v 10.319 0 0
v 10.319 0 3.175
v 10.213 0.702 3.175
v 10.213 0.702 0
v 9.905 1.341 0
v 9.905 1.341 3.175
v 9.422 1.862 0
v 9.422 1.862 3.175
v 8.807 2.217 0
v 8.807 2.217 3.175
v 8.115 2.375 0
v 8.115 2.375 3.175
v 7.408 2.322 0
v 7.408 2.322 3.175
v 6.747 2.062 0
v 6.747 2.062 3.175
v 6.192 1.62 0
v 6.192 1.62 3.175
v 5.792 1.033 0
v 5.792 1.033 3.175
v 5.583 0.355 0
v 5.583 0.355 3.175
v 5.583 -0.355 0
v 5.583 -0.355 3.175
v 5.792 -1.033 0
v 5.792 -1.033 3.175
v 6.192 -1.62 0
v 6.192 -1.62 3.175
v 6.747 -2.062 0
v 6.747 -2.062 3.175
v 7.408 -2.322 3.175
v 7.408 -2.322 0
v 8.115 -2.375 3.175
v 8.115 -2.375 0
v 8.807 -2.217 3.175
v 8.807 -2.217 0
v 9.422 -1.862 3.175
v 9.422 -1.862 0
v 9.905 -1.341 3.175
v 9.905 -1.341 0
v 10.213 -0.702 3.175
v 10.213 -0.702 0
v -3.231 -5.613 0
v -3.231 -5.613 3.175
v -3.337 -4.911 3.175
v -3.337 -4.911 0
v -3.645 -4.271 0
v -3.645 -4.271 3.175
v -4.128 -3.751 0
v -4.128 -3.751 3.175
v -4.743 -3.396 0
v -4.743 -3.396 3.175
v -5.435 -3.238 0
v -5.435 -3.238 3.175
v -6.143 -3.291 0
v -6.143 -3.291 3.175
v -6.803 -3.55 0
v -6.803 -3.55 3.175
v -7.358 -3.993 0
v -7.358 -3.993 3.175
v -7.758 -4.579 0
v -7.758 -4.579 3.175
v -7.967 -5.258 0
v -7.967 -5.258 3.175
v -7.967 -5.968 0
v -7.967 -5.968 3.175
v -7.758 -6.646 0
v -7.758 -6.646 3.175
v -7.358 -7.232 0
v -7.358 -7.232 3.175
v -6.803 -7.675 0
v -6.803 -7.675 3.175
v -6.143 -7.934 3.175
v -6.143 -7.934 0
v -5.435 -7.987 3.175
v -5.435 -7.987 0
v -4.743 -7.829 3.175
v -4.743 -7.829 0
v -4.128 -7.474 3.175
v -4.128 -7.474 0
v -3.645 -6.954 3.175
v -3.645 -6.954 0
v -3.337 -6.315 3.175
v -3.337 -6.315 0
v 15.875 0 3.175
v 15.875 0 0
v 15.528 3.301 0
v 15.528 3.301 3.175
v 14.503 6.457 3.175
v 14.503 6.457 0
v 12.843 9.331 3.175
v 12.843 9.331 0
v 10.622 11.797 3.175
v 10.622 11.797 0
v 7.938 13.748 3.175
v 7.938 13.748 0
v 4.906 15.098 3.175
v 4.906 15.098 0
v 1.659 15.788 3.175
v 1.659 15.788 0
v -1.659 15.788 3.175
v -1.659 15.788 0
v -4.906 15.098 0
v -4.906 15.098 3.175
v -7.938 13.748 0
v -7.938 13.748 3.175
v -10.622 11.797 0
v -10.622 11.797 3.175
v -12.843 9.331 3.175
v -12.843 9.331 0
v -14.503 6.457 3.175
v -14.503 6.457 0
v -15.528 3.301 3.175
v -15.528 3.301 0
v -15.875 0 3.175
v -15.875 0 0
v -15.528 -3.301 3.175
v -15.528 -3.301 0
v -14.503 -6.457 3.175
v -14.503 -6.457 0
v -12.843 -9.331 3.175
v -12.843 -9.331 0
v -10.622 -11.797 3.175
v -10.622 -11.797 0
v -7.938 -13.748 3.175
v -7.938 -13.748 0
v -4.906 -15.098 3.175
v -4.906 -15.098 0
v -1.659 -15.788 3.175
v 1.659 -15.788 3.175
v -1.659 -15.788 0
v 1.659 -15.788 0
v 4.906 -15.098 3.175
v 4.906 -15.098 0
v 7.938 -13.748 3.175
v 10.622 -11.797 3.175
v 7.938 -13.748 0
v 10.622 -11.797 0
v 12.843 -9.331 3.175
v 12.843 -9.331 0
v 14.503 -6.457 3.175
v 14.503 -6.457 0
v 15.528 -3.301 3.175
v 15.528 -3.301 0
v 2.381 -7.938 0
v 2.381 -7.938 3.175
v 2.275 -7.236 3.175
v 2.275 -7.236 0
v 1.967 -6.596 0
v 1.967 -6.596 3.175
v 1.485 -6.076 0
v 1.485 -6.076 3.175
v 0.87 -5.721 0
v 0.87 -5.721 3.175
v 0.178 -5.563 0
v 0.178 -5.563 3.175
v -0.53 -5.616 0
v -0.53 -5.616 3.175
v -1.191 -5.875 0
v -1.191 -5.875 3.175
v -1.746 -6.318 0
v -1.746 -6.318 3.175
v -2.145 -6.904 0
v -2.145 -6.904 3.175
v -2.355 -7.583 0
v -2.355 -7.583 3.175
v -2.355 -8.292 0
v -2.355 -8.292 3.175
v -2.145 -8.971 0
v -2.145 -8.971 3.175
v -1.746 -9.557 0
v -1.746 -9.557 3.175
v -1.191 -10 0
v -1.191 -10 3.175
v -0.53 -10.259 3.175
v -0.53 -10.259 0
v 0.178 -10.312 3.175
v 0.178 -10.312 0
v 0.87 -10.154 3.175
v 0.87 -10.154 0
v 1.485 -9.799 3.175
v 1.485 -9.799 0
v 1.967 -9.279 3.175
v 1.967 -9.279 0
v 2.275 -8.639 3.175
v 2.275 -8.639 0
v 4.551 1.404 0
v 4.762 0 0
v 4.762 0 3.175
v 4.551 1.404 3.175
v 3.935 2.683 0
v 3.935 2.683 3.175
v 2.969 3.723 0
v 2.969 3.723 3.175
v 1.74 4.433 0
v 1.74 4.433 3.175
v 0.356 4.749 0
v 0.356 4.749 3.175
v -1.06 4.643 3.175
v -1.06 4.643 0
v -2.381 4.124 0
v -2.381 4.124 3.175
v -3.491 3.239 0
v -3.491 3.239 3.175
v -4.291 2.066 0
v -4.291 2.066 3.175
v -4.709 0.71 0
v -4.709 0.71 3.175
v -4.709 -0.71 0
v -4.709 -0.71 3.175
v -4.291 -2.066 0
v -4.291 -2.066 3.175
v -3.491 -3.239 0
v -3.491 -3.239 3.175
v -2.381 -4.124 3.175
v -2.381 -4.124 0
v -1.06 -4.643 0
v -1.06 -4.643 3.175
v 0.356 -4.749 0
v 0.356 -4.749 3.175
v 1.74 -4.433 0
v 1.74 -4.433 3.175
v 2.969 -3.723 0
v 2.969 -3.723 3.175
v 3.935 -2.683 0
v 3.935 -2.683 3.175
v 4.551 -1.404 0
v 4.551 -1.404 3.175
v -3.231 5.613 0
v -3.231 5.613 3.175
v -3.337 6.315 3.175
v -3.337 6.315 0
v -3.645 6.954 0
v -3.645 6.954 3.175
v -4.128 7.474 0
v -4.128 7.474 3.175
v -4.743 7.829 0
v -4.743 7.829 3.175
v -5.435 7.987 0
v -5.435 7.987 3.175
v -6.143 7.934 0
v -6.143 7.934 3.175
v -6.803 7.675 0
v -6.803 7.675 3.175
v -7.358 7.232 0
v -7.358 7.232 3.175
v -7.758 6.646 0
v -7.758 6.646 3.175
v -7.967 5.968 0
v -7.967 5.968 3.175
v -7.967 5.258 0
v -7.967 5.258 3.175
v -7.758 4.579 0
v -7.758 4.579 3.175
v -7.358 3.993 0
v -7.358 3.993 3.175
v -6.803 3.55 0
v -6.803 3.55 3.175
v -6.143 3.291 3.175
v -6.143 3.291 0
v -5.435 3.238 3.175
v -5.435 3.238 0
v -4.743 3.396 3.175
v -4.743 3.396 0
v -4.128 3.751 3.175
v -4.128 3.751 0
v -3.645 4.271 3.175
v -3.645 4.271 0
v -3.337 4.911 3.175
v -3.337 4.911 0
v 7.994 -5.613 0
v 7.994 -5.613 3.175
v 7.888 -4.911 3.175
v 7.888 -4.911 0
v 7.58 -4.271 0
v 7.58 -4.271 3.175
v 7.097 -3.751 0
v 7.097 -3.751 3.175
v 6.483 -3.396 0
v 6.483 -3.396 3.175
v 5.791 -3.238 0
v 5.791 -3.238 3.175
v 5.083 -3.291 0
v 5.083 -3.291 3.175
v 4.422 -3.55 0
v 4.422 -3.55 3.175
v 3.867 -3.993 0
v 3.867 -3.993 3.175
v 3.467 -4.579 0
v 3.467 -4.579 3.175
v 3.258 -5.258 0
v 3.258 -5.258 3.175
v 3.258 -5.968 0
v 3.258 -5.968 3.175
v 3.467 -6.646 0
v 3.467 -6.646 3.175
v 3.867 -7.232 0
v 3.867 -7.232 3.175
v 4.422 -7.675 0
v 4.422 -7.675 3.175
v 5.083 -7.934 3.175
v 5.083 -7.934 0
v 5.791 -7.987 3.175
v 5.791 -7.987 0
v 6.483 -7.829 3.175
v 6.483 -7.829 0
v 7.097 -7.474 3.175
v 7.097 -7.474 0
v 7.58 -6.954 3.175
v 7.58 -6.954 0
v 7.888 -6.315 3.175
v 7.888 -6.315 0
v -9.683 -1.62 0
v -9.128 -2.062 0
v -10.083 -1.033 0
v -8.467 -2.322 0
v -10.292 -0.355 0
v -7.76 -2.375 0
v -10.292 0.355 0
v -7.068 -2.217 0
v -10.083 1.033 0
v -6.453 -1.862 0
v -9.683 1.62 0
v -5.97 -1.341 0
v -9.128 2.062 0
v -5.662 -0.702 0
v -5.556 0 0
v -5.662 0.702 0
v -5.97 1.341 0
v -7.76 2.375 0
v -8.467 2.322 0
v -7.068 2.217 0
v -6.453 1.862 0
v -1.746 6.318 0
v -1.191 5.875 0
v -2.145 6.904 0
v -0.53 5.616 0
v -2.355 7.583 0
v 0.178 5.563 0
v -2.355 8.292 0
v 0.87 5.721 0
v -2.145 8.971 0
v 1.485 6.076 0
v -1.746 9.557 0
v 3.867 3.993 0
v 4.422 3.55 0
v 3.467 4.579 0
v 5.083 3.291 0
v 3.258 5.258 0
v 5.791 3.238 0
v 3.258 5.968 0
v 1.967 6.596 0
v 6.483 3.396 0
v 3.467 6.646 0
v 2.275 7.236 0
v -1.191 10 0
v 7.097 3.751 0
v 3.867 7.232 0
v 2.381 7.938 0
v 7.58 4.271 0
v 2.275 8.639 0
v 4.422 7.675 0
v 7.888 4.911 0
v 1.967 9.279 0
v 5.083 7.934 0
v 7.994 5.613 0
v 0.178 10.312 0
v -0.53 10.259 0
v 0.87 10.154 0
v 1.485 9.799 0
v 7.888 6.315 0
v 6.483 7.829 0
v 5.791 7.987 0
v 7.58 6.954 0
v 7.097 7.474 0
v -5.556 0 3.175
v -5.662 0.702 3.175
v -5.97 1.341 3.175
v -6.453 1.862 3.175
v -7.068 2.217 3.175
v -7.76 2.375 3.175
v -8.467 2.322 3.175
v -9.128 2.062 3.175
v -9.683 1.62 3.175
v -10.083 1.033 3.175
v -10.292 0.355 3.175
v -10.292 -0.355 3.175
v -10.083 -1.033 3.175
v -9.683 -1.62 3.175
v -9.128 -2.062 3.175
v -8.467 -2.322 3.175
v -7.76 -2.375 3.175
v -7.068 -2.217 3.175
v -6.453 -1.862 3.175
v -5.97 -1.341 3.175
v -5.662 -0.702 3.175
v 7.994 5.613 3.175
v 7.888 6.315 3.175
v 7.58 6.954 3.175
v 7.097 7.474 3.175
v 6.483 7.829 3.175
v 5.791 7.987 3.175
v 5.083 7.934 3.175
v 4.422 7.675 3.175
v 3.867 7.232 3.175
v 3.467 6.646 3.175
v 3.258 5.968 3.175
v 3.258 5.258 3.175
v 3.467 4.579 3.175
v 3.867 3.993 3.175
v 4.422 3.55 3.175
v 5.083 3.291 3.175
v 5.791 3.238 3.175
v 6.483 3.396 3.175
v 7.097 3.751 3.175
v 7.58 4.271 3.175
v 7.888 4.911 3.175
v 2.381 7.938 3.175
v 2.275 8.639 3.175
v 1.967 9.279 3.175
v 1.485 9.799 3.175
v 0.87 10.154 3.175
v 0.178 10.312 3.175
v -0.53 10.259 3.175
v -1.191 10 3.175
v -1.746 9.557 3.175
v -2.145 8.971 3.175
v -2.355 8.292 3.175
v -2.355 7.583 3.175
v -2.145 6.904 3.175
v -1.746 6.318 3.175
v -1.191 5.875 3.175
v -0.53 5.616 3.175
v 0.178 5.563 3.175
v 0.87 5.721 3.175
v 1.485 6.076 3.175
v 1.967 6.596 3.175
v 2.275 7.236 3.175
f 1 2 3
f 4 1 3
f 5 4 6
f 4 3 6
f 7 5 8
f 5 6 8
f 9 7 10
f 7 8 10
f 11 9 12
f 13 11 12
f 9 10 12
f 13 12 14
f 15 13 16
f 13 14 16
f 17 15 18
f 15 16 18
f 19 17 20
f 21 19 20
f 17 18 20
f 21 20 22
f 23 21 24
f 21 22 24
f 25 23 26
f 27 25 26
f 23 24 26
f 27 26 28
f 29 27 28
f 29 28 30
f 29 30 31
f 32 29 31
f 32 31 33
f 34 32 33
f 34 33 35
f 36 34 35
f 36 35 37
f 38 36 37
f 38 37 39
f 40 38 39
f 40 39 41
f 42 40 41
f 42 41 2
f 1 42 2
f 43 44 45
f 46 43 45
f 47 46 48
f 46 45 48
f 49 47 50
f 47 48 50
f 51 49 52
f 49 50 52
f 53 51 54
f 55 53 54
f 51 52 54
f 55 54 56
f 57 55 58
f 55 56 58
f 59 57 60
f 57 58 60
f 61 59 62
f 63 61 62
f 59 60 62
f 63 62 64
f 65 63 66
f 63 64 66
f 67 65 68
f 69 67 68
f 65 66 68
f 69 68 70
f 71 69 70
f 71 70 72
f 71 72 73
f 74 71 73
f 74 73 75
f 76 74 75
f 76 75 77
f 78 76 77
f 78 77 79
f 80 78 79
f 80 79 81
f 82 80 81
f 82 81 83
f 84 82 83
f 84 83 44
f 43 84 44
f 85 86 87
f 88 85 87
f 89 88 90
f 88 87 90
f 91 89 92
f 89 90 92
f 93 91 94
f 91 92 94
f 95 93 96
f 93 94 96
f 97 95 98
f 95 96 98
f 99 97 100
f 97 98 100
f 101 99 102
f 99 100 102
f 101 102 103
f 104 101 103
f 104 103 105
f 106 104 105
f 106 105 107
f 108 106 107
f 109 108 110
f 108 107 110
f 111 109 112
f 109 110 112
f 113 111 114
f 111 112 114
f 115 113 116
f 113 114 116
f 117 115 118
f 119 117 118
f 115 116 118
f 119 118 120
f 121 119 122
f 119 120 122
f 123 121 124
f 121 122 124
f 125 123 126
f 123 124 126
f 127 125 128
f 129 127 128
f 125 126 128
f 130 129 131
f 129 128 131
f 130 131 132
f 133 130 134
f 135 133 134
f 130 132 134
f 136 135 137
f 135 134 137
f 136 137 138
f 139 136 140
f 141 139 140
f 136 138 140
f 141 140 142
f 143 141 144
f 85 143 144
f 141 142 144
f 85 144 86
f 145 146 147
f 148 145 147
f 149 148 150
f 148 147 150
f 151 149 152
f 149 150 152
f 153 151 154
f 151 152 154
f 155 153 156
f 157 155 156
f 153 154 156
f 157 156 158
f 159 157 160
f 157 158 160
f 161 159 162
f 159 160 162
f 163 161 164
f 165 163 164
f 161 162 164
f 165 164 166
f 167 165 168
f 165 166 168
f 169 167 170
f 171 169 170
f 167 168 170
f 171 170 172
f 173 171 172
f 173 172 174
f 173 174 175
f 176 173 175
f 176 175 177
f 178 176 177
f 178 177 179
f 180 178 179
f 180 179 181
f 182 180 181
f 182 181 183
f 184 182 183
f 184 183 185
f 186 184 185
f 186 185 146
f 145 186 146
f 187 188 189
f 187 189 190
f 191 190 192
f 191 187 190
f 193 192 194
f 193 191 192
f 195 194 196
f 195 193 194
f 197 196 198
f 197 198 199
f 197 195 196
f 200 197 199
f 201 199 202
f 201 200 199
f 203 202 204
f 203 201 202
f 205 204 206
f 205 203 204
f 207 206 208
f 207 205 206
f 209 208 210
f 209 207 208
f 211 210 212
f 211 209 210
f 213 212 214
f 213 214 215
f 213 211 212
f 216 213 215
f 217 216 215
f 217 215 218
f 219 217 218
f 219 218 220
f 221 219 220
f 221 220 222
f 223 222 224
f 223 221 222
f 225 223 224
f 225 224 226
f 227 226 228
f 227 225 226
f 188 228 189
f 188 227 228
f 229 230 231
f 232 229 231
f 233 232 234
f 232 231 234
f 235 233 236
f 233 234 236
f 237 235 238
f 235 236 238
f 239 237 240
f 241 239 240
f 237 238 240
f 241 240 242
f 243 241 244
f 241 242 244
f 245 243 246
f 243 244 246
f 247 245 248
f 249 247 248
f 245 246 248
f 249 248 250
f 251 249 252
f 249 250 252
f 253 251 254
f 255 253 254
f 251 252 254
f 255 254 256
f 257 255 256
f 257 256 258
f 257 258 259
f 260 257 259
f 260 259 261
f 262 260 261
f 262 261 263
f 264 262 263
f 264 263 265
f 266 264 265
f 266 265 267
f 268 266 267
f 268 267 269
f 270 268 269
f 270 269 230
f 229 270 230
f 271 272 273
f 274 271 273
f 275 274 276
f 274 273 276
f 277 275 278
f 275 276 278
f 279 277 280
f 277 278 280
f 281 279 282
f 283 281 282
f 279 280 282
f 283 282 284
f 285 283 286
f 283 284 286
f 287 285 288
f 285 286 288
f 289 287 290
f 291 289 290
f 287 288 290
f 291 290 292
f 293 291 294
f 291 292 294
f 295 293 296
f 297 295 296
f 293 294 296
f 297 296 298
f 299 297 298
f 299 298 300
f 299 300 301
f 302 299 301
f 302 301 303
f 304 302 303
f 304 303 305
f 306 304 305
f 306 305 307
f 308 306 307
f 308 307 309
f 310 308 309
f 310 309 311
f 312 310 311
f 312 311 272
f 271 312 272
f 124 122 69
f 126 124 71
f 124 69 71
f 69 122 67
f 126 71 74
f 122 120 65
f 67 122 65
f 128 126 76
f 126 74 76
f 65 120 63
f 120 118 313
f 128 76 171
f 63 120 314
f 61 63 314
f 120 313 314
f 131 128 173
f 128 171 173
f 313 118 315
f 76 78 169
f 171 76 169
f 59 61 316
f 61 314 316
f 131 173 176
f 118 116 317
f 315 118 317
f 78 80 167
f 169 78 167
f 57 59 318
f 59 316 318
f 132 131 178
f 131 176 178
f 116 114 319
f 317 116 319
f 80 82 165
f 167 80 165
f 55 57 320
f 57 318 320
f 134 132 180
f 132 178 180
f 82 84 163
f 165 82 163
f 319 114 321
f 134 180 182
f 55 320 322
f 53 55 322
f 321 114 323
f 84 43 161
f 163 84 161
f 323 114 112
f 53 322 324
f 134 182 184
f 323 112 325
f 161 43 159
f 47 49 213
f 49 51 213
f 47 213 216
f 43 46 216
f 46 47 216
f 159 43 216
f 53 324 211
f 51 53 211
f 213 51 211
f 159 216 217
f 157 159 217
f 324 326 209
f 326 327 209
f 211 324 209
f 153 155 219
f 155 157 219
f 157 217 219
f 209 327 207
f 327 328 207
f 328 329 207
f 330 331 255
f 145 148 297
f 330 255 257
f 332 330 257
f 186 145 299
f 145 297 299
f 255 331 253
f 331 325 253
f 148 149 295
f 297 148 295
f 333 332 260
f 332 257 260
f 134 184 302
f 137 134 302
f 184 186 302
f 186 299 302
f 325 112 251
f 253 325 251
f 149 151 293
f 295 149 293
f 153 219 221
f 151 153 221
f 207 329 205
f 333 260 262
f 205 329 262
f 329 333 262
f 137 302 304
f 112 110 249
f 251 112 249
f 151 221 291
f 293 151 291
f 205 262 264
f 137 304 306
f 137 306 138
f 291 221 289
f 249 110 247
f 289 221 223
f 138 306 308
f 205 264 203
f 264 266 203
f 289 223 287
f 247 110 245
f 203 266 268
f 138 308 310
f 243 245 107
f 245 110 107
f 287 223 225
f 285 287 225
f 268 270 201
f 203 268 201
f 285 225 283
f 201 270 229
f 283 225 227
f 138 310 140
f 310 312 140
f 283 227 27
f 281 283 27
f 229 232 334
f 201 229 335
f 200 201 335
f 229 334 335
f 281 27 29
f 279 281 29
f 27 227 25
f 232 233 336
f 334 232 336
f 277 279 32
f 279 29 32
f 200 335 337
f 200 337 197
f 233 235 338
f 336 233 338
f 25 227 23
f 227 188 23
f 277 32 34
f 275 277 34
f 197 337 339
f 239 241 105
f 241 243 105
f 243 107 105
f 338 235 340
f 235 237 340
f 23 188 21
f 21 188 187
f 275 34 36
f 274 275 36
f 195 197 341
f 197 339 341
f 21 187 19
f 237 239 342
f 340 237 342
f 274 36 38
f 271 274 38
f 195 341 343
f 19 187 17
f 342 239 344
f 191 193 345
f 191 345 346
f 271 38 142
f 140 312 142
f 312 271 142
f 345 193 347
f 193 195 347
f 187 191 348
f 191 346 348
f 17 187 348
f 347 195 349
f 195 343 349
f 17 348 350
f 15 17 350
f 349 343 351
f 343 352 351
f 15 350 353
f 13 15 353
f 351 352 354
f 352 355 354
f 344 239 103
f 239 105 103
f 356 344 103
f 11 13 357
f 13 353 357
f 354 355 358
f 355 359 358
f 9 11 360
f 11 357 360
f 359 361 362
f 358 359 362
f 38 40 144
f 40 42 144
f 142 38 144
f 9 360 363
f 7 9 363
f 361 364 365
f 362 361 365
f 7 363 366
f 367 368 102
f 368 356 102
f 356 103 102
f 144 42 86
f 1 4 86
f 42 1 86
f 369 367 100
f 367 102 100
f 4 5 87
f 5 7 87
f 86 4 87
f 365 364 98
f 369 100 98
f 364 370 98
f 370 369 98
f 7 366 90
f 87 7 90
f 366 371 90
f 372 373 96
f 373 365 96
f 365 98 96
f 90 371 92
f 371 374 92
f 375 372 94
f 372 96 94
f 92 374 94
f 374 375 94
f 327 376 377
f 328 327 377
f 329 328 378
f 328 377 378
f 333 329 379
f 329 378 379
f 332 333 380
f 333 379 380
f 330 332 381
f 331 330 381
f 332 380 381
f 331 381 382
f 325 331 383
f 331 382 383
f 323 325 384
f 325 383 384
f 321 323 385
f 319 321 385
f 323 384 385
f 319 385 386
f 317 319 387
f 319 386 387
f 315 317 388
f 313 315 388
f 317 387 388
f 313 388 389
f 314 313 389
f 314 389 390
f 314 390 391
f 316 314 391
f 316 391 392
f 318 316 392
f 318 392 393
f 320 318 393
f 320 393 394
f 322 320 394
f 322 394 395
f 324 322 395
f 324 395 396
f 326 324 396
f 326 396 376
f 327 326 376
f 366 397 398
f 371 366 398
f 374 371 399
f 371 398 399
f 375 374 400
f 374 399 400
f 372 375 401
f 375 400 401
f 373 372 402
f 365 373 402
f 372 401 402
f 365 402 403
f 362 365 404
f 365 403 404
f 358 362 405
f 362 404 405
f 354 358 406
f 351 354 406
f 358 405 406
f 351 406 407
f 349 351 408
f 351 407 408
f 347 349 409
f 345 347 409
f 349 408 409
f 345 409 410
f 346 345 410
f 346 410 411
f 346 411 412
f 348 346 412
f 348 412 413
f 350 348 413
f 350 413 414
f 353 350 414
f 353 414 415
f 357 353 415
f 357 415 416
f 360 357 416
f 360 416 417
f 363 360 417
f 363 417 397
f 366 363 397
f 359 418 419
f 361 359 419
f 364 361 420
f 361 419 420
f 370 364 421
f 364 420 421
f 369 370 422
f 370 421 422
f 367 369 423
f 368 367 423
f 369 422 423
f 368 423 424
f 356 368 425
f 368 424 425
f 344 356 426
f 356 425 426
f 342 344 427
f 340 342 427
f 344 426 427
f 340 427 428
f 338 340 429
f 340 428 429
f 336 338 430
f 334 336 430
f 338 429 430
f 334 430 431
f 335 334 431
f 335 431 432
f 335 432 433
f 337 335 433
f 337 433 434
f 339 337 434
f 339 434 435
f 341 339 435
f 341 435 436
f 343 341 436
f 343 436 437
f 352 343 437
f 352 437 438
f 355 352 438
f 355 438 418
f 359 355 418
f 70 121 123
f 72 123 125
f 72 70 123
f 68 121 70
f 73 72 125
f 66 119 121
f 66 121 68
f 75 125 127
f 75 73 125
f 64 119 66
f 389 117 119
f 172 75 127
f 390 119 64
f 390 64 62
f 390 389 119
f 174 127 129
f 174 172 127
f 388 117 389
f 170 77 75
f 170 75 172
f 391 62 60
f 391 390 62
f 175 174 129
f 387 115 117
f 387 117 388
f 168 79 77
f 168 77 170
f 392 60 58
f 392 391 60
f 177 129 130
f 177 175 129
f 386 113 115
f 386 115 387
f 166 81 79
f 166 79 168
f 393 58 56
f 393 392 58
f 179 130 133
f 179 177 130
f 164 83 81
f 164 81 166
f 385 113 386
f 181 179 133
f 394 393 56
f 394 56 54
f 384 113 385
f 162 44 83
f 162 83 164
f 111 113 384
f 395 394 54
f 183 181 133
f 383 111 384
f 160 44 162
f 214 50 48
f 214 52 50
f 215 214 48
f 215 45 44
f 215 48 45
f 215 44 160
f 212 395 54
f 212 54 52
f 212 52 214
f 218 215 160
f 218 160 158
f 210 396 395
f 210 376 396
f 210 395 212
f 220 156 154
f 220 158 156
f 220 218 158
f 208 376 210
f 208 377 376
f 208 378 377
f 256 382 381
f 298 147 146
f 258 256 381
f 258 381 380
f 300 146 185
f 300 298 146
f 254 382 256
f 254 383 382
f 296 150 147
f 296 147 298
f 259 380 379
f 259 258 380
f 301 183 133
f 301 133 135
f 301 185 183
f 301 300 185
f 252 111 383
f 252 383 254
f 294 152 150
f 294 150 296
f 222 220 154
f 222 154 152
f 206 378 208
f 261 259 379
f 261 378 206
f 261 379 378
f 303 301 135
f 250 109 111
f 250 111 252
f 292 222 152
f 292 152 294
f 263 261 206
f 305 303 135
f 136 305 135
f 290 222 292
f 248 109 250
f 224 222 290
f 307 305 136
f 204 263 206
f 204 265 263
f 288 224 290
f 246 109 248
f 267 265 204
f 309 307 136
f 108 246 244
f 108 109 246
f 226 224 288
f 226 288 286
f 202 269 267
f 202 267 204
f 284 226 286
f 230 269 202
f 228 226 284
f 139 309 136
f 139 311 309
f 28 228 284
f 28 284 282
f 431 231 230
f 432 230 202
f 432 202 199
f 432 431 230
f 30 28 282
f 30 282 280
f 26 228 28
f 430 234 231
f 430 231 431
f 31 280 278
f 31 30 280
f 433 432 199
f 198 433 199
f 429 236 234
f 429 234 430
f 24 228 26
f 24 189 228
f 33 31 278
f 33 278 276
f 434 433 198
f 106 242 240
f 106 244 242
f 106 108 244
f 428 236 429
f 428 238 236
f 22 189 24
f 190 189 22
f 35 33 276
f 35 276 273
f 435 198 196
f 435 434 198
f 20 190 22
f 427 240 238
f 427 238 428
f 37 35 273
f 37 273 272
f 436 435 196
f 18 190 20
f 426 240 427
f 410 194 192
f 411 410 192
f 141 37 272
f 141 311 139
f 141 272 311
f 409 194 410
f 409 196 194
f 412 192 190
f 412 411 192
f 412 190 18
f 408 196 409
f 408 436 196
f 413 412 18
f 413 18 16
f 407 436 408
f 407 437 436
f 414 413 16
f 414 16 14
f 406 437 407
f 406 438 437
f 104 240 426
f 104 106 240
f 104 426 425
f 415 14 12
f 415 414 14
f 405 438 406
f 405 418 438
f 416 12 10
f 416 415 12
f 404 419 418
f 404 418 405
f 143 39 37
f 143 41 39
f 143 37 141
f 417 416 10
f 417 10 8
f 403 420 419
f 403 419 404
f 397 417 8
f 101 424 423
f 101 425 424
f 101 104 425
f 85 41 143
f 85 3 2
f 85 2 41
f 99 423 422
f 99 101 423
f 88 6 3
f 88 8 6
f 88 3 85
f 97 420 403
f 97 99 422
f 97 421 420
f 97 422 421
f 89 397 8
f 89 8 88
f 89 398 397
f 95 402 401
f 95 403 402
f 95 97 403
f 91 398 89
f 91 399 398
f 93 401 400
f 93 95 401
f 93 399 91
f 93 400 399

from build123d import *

# Parameters (mm, degrees)
F0_R      = 15.875
F0_R_2    = 4.7625
F1_DEPTH  = 3.175
F3_DEPTH  = 6.35
F4_R      = 15.875
F4_R_2    = 4.7625
F5_DEPTH  = 3.175
F6_R      = 2.38125
F7_DEPTH  = 25.4
F8_R      = 2.38125
F8_R_2    = 1.5875
F9_DEPTH  = 25.4
F10_DEPTH = 3.175
F11_DEPTH = 6.35


with BuildPart() as f1:
    # F0 (on Top) → F1 (new body)
    with BuildSketch(Plane.XY):
        Circle(F0_R)
        Circle(F0_R_2, mode=Mode.SUBTRACT)
    extrude(amount=F1_DEPTH)


with BuildPart() as f3:
    # F2 (on face) → F3 (new body)
    with BuildSketch(Plane.XY.offset(3.175)):
        with BuildLine():
            ThreePointArc((-2.38125, 5.1952741446), (0, 5.715), (2.38125, 5.1952741446))
            Line((2.38125, 5.1952741446), (2.38125, 6.35))
            Line((2.38125, 6.35), (-2.38125, 6.35))
            Line((-2.38125, 6.35), (-2.38125, 5.1952741446))
        make_face()
        with BuildLine():
            Line((2.38125, -6.35), (2.38125, -5.1952741446))
            ThreePointArc((2.38125, -5.1952741446), (0, -5.715), (-2.38125, -5.1952741446))
            Line((-2.38125, -5.1952741446), (-2.38125, -6.35))
            Line((-2.38125, -6.35), (2.38125, -6.35))
        make_face()
        with BuildLine():
            ThreePointArc((-2.38125, 4.1244459855), (0, 4.7625), (2.38125, 4.1244459855))
            Line((2.38125, 4.1244459855), (2.38125, 5.1952741446))
            ThreePointArc((2.38125, 5.1952741446), (0, 5.715), (-2.38125, 5.1952741446))
            Line((-2.38125, 5.1952741446), (-2.38125, 4.1244459855))
        make_face()
        with BuildLine():
            ThreePointArc((2.38125, 4.1244459855), (3.3675960454, 3.3675960454), (4.1244459855, 2.38125))
            Line((4.1244459855, 2.38125), (5.1952741446, 2.38125))
            ThreePointArc((5.1952741446, 2.38125), (4.0411152545, 4.0411152545), (2.38125, 5.1952741446))
            Line((2.38125, 5.1952741446), (2.38125, 4.1244459855))
        make_face()
        with BuildLine():
            Line((2.38125, -5.1952741446), (2.38125, -4.1244459855))
            ThreePointArc((2.38125, -4.1244459855), (0, -4.7625), (-2.38125, -4.1244459855))
            Line((-2.38125, -4.1244459855), (-2.38125, -5.1952741446))
            ThreePointArc((-2.38125, -5.1952741446), (0, -5.715), (2.38125, -5.1952741446))
        make_face()
        with BuildLine():
            Line((-2.38125, -5.1952741446), (-2.38125, -4.1244459855))
            ThreePointArc((-2.38125, -4.1244459855), (-3.3675960454, -3.3675960454), (-4.1244459855, -2.38125))
            Line((-4.1244459855, -2.38125), (-5.1952741446, -2.38125))
            ThreePointArc((-5.1952741446, -2.38125), (-4.0411152545, -4.0411152545), (-2.38125, -5.1952741446))
        make_face()
        with BuildLine():
            ThreePointArc((-4.1244459855, -2.38125), (-4.7625, 0), (-4.1244459855, 2.38125))
            Line((-4.1244459855, 2.38125), (-5.1952741446, 2.38125))
            ThreePointArc((-5.1952741446, 2.38125), (-5.715, 0), (-5.1952741446, -2.38125))
            Line((-5.1952741446, -2.38125), (-4.1244459855, -2.38125))
        make_face()
        with BuildLine():
            ThreePointArc((-4.1244459855, 2.38125), (-3.3675960454, 3.3675960454), (-2.38125, 4.1244459855))
            Line((-2.38125, 4.1244459855), (-2.38125, 5.1952741446))
            ThreePointArc((-2.38125, 5.1952741446), (-4.0411152545, 4.0411152545), (-5.1952741446, 2.38125))
            Line((-5.1952741446, 2.38125), (-4.1244459855, 2.38125))
        make_face()
        with BuildLine():
            ThreePointArc((-5.1952741446, -2.38125), (-5.715, 0), (-5.1952741446, 2.38125))
            Line((-5.1952741446, 2.38125), (-6.35, 2.38125))
            Line((-6.35, 2.38125), (-6.35, -2.38125))
            Line((-6.35, -2.38125), (-5.1952741446, -2.38125))
        make_face()
    extrude(amount=F3_DEPTH)



with BuildPart() as f3b:
    # F2 (on face) → F3, piece 2 (new body)
    with BuildSketch(Plane.XY.offset(3.175)):
        with BuildLine():
            Line((6.35, 2.38125), (5.1952741446, 2.38125))
            ThreePointArc((5.1952741446, 2.38125), (5.5835569638, 1.2186536144), (5.715, 0))
            ThreePointArc((5.715, 0), (5.5835569638, -1.2186536144), (5.1952741446, -2.38125))
            Line((5.1952741446, -2.38125), (6.35, -2.38125))
            Line((6.35, -2.38125), (6.35, 2.38125))
        make_face()
    extrude(amount=F3_DEPTH)


with BuildPart() as f3_1:
    add(f3.part)

    add(f3b.part)  # F5 merges F3b
    # F4 (on face) → F5 (join)
    with BuildSketch(Plane.XY.offset(9.525)):
        Circle(F4_R)
        Circle(F4_R_2, mode=Mode.SUBTRACT)
    extrude(amount=F5_DEPTH)


with BuildPart() as f7_tool:
    # F6 (on face) → F7 (new body)
    with BuildSketch(Plane.XY.offset(12.7)):
        with Locations((-5.6126600757, 5.6126600757)):
            Circle(F6_R)
        with Locations((5.6126600757, -5.6126600757)):
            Circle(F6_R)
        with Locations((0, 7.9375)):
            Circle(F6_R)
        with Locations((5.6126600757, 5.6126600757)):
            Circle(F6_R)
        with Locations((7.9375, 0)):
            Circle(F6_R)
        with Locations((0, -7.9375)):
            Circle(F6_R)
        with Locations((-5.6126600757, -5.6126600757)):
            Circle(F6_R)
        with Locations((-7.9375, 0)):
            Circle(F6_R)
    extrude(amount=-F7_DEPTH)


with BuildPart() as f1_1:
    add(f1.part)

    # F7: cut by f7_tool
    add(f7_tool.part, mode=Mode.SUBTRACT)

    # F8 (on face) → F9 (cut)
    with BuildSketch(Plane(origin=(0, 0, 0), x_dir=(1, 0, 0), z_dir=(0, 0, -1))):
        with Locations((0, 7.9375)):
            Circle(F8_R)
        with Locations((0, 7.9375)):
            Circle(F8_R_2, mode=Mode.SUBTRACT)
        with Locations((5.6126600757, 5.6126600757)):
            Circle(F8_R)
        with Locations((5.6126600757, 5.6126600757)):
            Circle(F8_R_2, mode=Mode.SUBTRACT)
        with Locations((7.9375, 0)):
            Circle(F8_R)
        with Locations((7.9375, 0)):
            Circle(F8_R_2, mode=Mode.SUBTRACT)
        with Locations((5.6126600757, -5.6126600757)):
            Circle(F8_R)
        with Locations((5.6126600757, -5.6126600757)):
            Circle(F8_R_2, mode=Mode.SUBTRACT)
        with Locations((0, -7.9375)):
            Circle(F8_R)
        with Locations((0, -7.9375)):
            Circle(F8_R_2, mode=Mode.SUBTRACT)
        with Locations((-5.6126600757, -5.6126600757)):
            Circle(F8_R)
        with Locations((-5.6126600757, -5.6126600757)):
            Circle(F8_R_2, mode=Mode.SUBTRACT)
        with Locations((-7.9375, 0)):
            Circle(F8_R)
        with Locations((-7.9375, 0)):
            Circle(F8_R_2, mode=Mode.SUBTRACT)
        with Locations((-5.6126600757, 5.6126600757)):
            Circle(F8_R)
        with Locations((-5.6126600757, 5.6126600757)):
            Circle(F8_R_2, mode=Mode.SUBTRACT)
        with Locations((7.9375, 0)):
            Circle(F8_R_2)
        with Locations((5.6126600757, -5.6126600757)):
            Circle(F8_R_2)
        with Locations((0, -7.9375)):
            Circle(F8_R_2)
        with Locations((-5.6126600757, -5.6126600757)):
            Circle(F8_R_2)
        with Locations((-7.9375, 0)):
            Circle(F8_R_2)
        with Locations((-5.6126600757, 5.6126600757)):
            Circle(F8_R_2)
        with Locations((0, 7.9375)):
            Circle(F8_R_2)
        with Locations((5.6126600757, 5.6126600757)):
            Circle(F8_R_2)
    extrude(amount=-F9_DEPTH, mode=Mode.SUBTRACT)


with BuildPart() as f3_2:
    add(f3_1.part)

    # F7: cut by f7_tool
    add(f7_tool.part, mode=Mode.SUBTRACT)

    # F10 (cut): a face of the model
    f10_faces = [f3_2.faces().sort_by_distance(p)[0] for p in [
        (-15.4259871939, 0, 12.7),
    ]]
    extrude(f10_faces, amount=-F10_DEPTH, mode=Mode.SUBTRACT)

    # F11 (cut): faces of the model
    f11_faces = [f3_2.faces().sort_by_distance(p)[0] for p in [
        (5.820119134, -1.8463906572, 9.525),
        (-3.8074982703, -3.8074982703, 9.525),
        (5.820119134, 1.8463906572, 9.525),
    ]]
    extrude(f11_faces, amount=-F11_DEPTH, mode=Mode.SUBTRACT)


solid = f1_1.part
